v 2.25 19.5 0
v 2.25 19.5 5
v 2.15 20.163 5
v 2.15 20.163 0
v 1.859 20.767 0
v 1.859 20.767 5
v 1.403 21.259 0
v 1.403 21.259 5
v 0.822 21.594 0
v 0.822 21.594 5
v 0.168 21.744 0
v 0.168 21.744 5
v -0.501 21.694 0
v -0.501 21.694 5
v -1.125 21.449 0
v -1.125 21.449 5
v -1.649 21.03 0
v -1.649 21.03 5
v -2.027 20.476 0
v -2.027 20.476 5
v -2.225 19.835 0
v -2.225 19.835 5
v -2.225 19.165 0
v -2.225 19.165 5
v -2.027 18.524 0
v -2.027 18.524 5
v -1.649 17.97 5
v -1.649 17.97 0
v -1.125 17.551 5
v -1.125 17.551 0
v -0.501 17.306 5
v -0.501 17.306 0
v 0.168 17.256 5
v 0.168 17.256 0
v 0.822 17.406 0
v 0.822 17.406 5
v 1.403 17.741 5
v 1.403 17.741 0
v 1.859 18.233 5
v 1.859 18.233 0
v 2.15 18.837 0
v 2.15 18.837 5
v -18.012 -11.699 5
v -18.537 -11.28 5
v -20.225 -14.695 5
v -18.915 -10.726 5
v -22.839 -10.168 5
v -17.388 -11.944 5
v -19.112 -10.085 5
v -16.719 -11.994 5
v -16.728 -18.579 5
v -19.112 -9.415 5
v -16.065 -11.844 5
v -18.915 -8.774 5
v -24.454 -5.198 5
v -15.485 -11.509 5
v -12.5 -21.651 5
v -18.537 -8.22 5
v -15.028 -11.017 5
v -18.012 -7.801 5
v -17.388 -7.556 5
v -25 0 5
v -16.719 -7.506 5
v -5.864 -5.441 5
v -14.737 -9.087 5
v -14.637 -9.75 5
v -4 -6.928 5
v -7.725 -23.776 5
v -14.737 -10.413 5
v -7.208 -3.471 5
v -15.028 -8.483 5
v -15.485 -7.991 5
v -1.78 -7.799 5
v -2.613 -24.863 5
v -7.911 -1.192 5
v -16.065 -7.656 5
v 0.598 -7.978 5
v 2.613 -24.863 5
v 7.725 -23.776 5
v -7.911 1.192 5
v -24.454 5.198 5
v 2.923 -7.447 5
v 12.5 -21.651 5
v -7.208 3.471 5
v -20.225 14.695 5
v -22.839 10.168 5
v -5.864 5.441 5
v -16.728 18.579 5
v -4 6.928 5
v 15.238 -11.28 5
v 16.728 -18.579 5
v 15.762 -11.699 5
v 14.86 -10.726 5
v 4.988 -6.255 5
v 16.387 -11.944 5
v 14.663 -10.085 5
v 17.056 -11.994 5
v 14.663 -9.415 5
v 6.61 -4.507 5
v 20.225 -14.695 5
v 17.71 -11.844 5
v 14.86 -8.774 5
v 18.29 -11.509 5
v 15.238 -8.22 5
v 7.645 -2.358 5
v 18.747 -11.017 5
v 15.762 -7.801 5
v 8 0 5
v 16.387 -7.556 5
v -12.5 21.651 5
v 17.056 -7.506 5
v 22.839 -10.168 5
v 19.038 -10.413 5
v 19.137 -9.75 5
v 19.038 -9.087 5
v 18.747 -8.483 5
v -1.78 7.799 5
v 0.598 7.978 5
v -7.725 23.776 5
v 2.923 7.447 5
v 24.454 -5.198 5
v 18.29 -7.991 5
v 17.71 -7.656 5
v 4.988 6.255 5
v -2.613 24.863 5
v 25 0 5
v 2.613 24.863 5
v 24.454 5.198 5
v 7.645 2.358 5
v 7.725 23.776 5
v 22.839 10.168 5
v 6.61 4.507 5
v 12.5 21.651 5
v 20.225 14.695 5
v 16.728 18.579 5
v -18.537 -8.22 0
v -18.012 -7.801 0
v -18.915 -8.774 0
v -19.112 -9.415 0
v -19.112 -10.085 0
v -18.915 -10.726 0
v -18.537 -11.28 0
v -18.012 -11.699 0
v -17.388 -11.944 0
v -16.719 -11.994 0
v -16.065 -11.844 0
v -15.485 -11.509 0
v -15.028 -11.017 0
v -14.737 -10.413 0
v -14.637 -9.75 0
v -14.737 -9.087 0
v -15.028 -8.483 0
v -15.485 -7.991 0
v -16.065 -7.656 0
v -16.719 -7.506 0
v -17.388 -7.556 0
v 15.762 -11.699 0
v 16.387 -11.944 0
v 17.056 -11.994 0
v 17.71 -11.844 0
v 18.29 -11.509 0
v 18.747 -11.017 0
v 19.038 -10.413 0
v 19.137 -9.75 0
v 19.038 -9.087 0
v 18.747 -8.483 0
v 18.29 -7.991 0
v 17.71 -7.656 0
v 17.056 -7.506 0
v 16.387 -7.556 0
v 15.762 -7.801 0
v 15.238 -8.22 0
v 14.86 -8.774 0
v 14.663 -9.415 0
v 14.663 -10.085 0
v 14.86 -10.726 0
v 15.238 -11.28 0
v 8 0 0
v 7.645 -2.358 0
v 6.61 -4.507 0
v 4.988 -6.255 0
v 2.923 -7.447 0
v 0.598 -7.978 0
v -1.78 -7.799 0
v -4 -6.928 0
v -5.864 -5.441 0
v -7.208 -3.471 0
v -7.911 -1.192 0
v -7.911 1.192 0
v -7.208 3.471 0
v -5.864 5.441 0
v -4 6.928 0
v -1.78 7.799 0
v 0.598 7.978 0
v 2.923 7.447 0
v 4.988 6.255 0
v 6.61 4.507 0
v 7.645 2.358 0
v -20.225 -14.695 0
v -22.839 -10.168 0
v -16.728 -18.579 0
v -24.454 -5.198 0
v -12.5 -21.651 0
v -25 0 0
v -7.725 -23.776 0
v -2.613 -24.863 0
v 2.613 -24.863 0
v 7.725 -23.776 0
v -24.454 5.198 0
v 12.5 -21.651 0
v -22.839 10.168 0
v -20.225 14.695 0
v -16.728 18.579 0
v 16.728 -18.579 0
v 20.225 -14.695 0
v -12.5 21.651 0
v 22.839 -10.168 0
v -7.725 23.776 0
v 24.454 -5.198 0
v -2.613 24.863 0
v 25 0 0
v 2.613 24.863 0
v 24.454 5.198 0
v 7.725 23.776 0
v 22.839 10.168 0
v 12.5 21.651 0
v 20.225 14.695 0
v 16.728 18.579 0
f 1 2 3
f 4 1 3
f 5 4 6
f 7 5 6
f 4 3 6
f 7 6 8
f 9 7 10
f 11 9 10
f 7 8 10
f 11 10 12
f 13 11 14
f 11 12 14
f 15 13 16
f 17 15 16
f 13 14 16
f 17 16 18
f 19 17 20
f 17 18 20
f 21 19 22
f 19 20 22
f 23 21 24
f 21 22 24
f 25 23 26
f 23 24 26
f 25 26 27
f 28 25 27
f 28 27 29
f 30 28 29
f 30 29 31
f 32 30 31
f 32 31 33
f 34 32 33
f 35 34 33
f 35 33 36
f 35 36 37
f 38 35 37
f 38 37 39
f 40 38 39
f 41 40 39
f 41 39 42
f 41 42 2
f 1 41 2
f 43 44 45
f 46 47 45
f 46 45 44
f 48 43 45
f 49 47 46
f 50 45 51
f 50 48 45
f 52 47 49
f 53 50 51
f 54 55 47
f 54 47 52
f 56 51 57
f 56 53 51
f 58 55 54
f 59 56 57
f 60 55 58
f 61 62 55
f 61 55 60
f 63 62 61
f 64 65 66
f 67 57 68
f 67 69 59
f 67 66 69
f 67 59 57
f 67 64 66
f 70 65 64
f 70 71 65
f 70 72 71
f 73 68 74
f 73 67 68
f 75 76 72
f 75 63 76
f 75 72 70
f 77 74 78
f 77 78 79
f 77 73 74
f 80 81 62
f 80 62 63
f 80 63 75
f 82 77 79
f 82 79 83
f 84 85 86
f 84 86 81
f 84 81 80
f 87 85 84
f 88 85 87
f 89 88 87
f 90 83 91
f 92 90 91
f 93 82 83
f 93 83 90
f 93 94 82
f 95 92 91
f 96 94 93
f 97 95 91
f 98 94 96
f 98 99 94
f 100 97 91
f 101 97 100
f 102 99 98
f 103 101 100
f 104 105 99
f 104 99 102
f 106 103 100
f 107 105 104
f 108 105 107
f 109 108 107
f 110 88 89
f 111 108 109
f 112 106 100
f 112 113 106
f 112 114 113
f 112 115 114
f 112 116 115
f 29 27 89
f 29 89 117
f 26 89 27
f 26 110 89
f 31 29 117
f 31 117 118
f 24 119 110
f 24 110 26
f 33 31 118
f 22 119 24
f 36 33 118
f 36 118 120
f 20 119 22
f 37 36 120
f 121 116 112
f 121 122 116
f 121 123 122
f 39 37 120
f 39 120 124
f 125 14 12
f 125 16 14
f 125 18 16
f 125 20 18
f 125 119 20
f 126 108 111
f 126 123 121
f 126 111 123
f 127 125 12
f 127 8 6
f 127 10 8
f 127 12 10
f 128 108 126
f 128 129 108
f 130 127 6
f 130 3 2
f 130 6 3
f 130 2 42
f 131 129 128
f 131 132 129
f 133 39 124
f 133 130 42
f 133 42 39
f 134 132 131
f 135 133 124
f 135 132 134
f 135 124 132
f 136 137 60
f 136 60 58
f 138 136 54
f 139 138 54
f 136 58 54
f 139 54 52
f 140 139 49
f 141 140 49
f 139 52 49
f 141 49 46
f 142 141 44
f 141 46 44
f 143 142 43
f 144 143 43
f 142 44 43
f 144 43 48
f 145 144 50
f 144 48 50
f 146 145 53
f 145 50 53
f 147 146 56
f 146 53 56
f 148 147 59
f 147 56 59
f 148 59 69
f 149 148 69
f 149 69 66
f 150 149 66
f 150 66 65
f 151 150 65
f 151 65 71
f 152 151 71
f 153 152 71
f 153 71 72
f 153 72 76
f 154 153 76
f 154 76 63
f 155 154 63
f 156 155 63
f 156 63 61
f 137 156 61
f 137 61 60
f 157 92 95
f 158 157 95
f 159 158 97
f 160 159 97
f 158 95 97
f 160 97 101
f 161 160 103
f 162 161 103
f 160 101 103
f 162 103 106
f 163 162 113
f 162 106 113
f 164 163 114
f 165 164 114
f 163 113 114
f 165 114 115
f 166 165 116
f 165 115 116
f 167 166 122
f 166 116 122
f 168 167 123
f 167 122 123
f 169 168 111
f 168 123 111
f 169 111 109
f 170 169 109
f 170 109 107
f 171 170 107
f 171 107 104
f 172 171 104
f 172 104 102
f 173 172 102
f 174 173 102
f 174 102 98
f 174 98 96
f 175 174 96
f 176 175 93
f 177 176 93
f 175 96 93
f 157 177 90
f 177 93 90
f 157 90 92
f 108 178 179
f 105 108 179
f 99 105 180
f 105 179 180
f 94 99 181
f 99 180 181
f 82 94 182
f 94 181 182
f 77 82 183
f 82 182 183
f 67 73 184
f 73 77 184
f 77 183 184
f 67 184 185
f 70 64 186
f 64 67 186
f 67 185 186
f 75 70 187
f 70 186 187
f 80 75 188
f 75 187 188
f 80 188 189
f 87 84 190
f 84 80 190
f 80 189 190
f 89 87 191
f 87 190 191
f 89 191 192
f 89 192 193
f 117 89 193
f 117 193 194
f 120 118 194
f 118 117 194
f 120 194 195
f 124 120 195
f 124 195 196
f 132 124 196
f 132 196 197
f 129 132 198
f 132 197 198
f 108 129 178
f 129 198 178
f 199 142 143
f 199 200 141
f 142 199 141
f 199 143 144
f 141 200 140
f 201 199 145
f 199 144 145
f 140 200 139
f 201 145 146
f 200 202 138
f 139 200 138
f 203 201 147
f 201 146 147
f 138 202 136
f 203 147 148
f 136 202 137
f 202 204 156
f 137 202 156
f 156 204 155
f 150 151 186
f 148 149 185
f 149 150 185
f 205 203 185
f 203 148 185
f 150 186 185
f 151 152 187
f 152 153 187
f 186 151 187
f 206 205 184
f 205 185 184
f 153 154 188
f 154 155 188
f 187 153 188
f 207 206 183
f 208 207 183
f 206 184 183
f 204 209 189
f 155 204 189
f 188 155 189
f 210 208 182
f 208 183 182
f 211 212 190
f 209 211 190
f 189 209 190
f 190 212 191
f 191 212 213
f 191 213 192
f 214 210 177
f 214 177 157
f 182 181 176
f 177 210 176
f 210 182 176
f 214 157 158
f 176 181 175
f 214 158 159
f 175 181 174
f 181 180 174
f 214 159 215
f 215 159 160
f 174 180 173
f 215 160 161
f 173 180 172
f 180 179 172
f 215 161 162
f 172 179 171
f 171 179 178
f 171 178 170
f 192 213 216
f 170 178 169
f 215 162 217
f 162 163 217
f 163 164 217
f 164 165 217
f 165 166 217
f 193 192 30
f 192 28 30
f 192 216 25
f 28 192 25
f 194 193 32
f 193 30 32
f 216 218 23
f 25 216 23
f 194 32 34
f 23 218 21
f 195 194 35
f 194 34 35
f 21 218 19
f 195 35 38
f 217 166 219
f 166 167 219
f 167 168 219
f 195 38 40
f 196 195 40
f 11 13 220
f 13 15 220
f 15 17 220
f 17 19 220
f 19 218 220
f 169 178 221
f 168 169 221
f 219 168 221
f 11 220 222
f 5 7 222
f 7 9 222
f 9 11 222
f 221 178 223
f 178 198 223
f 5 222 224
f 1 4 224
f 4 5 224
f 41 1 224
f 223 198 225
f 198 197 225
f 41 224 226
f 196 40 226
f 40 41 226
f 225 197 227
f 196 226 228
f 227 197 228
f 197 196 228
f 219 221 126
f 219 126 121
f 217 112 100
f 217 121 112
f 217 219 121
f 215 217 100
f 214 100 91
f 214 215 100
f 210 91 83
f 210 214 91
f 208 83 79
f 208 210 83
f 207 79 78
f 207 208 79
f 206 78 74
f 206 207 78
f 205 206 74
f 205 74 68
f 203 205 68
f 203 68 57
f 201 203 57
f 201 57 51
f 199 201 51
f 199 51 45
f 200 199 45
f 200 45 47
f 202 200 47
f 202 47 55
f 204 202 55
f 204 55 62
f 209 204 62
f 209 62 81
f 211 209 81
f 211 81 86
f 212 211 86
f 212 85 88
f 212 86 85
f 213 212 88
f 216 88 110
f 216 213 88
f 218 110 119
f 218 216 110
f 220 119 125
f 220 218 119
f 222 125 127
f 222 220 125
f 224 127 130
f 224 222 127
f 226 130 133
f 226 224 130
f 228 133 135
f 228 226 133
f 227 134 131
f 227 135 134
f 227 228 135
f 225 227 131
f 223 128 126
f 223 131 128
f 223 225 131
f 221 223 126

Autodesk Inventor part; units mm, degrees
ref_plane "YZ Plane" through (0, 0, 0) normal (1, 0, 0) x (0, 1, 0)
ref_plane "XZ Plane" through (0, 0, 0) normal (0, 1, 0) x (-1, 0, 0)
ref_plane "XY Plane" through (0, 0, 0) normal (0, 0, 1) x (1, 0, 0)
sketch "Esboço1" plane through (0, 0, 0) normal (0, 0, 1) x (1, 0, 0)
  circle A0 centre (0, 0) radius 25
  circle A1 centre (0, 0) radius 8
  dimension "d0" = 50
  dimension "d1" = 16
extrude "Extrusão1" add sketch "Esboço1" along normal blind 5
sketch "Esboço2" plane through (0, 0, 5) normal (0, 0, 1) x (1, 0, 0)
  circle A0 centre (0, 0) radius 14 construction
  circle A1 centre (0, 0) radius 25 construction
  line L0 (0, 25) -> (0, 14) construction
  circle A2 centre (0, 19.5) radius 2.25
  dimension "d4" = 28
  dimension "d5" = 4.5
extrude "Extrusão2" cut sketch "Esboço2" against normal through all
pattern_circular "Padrão circular1" count 3 over 360 about axis through (0, 0, 0) along (0, 0, 1) of "Extrusão2"
properties part number "Retentor"
